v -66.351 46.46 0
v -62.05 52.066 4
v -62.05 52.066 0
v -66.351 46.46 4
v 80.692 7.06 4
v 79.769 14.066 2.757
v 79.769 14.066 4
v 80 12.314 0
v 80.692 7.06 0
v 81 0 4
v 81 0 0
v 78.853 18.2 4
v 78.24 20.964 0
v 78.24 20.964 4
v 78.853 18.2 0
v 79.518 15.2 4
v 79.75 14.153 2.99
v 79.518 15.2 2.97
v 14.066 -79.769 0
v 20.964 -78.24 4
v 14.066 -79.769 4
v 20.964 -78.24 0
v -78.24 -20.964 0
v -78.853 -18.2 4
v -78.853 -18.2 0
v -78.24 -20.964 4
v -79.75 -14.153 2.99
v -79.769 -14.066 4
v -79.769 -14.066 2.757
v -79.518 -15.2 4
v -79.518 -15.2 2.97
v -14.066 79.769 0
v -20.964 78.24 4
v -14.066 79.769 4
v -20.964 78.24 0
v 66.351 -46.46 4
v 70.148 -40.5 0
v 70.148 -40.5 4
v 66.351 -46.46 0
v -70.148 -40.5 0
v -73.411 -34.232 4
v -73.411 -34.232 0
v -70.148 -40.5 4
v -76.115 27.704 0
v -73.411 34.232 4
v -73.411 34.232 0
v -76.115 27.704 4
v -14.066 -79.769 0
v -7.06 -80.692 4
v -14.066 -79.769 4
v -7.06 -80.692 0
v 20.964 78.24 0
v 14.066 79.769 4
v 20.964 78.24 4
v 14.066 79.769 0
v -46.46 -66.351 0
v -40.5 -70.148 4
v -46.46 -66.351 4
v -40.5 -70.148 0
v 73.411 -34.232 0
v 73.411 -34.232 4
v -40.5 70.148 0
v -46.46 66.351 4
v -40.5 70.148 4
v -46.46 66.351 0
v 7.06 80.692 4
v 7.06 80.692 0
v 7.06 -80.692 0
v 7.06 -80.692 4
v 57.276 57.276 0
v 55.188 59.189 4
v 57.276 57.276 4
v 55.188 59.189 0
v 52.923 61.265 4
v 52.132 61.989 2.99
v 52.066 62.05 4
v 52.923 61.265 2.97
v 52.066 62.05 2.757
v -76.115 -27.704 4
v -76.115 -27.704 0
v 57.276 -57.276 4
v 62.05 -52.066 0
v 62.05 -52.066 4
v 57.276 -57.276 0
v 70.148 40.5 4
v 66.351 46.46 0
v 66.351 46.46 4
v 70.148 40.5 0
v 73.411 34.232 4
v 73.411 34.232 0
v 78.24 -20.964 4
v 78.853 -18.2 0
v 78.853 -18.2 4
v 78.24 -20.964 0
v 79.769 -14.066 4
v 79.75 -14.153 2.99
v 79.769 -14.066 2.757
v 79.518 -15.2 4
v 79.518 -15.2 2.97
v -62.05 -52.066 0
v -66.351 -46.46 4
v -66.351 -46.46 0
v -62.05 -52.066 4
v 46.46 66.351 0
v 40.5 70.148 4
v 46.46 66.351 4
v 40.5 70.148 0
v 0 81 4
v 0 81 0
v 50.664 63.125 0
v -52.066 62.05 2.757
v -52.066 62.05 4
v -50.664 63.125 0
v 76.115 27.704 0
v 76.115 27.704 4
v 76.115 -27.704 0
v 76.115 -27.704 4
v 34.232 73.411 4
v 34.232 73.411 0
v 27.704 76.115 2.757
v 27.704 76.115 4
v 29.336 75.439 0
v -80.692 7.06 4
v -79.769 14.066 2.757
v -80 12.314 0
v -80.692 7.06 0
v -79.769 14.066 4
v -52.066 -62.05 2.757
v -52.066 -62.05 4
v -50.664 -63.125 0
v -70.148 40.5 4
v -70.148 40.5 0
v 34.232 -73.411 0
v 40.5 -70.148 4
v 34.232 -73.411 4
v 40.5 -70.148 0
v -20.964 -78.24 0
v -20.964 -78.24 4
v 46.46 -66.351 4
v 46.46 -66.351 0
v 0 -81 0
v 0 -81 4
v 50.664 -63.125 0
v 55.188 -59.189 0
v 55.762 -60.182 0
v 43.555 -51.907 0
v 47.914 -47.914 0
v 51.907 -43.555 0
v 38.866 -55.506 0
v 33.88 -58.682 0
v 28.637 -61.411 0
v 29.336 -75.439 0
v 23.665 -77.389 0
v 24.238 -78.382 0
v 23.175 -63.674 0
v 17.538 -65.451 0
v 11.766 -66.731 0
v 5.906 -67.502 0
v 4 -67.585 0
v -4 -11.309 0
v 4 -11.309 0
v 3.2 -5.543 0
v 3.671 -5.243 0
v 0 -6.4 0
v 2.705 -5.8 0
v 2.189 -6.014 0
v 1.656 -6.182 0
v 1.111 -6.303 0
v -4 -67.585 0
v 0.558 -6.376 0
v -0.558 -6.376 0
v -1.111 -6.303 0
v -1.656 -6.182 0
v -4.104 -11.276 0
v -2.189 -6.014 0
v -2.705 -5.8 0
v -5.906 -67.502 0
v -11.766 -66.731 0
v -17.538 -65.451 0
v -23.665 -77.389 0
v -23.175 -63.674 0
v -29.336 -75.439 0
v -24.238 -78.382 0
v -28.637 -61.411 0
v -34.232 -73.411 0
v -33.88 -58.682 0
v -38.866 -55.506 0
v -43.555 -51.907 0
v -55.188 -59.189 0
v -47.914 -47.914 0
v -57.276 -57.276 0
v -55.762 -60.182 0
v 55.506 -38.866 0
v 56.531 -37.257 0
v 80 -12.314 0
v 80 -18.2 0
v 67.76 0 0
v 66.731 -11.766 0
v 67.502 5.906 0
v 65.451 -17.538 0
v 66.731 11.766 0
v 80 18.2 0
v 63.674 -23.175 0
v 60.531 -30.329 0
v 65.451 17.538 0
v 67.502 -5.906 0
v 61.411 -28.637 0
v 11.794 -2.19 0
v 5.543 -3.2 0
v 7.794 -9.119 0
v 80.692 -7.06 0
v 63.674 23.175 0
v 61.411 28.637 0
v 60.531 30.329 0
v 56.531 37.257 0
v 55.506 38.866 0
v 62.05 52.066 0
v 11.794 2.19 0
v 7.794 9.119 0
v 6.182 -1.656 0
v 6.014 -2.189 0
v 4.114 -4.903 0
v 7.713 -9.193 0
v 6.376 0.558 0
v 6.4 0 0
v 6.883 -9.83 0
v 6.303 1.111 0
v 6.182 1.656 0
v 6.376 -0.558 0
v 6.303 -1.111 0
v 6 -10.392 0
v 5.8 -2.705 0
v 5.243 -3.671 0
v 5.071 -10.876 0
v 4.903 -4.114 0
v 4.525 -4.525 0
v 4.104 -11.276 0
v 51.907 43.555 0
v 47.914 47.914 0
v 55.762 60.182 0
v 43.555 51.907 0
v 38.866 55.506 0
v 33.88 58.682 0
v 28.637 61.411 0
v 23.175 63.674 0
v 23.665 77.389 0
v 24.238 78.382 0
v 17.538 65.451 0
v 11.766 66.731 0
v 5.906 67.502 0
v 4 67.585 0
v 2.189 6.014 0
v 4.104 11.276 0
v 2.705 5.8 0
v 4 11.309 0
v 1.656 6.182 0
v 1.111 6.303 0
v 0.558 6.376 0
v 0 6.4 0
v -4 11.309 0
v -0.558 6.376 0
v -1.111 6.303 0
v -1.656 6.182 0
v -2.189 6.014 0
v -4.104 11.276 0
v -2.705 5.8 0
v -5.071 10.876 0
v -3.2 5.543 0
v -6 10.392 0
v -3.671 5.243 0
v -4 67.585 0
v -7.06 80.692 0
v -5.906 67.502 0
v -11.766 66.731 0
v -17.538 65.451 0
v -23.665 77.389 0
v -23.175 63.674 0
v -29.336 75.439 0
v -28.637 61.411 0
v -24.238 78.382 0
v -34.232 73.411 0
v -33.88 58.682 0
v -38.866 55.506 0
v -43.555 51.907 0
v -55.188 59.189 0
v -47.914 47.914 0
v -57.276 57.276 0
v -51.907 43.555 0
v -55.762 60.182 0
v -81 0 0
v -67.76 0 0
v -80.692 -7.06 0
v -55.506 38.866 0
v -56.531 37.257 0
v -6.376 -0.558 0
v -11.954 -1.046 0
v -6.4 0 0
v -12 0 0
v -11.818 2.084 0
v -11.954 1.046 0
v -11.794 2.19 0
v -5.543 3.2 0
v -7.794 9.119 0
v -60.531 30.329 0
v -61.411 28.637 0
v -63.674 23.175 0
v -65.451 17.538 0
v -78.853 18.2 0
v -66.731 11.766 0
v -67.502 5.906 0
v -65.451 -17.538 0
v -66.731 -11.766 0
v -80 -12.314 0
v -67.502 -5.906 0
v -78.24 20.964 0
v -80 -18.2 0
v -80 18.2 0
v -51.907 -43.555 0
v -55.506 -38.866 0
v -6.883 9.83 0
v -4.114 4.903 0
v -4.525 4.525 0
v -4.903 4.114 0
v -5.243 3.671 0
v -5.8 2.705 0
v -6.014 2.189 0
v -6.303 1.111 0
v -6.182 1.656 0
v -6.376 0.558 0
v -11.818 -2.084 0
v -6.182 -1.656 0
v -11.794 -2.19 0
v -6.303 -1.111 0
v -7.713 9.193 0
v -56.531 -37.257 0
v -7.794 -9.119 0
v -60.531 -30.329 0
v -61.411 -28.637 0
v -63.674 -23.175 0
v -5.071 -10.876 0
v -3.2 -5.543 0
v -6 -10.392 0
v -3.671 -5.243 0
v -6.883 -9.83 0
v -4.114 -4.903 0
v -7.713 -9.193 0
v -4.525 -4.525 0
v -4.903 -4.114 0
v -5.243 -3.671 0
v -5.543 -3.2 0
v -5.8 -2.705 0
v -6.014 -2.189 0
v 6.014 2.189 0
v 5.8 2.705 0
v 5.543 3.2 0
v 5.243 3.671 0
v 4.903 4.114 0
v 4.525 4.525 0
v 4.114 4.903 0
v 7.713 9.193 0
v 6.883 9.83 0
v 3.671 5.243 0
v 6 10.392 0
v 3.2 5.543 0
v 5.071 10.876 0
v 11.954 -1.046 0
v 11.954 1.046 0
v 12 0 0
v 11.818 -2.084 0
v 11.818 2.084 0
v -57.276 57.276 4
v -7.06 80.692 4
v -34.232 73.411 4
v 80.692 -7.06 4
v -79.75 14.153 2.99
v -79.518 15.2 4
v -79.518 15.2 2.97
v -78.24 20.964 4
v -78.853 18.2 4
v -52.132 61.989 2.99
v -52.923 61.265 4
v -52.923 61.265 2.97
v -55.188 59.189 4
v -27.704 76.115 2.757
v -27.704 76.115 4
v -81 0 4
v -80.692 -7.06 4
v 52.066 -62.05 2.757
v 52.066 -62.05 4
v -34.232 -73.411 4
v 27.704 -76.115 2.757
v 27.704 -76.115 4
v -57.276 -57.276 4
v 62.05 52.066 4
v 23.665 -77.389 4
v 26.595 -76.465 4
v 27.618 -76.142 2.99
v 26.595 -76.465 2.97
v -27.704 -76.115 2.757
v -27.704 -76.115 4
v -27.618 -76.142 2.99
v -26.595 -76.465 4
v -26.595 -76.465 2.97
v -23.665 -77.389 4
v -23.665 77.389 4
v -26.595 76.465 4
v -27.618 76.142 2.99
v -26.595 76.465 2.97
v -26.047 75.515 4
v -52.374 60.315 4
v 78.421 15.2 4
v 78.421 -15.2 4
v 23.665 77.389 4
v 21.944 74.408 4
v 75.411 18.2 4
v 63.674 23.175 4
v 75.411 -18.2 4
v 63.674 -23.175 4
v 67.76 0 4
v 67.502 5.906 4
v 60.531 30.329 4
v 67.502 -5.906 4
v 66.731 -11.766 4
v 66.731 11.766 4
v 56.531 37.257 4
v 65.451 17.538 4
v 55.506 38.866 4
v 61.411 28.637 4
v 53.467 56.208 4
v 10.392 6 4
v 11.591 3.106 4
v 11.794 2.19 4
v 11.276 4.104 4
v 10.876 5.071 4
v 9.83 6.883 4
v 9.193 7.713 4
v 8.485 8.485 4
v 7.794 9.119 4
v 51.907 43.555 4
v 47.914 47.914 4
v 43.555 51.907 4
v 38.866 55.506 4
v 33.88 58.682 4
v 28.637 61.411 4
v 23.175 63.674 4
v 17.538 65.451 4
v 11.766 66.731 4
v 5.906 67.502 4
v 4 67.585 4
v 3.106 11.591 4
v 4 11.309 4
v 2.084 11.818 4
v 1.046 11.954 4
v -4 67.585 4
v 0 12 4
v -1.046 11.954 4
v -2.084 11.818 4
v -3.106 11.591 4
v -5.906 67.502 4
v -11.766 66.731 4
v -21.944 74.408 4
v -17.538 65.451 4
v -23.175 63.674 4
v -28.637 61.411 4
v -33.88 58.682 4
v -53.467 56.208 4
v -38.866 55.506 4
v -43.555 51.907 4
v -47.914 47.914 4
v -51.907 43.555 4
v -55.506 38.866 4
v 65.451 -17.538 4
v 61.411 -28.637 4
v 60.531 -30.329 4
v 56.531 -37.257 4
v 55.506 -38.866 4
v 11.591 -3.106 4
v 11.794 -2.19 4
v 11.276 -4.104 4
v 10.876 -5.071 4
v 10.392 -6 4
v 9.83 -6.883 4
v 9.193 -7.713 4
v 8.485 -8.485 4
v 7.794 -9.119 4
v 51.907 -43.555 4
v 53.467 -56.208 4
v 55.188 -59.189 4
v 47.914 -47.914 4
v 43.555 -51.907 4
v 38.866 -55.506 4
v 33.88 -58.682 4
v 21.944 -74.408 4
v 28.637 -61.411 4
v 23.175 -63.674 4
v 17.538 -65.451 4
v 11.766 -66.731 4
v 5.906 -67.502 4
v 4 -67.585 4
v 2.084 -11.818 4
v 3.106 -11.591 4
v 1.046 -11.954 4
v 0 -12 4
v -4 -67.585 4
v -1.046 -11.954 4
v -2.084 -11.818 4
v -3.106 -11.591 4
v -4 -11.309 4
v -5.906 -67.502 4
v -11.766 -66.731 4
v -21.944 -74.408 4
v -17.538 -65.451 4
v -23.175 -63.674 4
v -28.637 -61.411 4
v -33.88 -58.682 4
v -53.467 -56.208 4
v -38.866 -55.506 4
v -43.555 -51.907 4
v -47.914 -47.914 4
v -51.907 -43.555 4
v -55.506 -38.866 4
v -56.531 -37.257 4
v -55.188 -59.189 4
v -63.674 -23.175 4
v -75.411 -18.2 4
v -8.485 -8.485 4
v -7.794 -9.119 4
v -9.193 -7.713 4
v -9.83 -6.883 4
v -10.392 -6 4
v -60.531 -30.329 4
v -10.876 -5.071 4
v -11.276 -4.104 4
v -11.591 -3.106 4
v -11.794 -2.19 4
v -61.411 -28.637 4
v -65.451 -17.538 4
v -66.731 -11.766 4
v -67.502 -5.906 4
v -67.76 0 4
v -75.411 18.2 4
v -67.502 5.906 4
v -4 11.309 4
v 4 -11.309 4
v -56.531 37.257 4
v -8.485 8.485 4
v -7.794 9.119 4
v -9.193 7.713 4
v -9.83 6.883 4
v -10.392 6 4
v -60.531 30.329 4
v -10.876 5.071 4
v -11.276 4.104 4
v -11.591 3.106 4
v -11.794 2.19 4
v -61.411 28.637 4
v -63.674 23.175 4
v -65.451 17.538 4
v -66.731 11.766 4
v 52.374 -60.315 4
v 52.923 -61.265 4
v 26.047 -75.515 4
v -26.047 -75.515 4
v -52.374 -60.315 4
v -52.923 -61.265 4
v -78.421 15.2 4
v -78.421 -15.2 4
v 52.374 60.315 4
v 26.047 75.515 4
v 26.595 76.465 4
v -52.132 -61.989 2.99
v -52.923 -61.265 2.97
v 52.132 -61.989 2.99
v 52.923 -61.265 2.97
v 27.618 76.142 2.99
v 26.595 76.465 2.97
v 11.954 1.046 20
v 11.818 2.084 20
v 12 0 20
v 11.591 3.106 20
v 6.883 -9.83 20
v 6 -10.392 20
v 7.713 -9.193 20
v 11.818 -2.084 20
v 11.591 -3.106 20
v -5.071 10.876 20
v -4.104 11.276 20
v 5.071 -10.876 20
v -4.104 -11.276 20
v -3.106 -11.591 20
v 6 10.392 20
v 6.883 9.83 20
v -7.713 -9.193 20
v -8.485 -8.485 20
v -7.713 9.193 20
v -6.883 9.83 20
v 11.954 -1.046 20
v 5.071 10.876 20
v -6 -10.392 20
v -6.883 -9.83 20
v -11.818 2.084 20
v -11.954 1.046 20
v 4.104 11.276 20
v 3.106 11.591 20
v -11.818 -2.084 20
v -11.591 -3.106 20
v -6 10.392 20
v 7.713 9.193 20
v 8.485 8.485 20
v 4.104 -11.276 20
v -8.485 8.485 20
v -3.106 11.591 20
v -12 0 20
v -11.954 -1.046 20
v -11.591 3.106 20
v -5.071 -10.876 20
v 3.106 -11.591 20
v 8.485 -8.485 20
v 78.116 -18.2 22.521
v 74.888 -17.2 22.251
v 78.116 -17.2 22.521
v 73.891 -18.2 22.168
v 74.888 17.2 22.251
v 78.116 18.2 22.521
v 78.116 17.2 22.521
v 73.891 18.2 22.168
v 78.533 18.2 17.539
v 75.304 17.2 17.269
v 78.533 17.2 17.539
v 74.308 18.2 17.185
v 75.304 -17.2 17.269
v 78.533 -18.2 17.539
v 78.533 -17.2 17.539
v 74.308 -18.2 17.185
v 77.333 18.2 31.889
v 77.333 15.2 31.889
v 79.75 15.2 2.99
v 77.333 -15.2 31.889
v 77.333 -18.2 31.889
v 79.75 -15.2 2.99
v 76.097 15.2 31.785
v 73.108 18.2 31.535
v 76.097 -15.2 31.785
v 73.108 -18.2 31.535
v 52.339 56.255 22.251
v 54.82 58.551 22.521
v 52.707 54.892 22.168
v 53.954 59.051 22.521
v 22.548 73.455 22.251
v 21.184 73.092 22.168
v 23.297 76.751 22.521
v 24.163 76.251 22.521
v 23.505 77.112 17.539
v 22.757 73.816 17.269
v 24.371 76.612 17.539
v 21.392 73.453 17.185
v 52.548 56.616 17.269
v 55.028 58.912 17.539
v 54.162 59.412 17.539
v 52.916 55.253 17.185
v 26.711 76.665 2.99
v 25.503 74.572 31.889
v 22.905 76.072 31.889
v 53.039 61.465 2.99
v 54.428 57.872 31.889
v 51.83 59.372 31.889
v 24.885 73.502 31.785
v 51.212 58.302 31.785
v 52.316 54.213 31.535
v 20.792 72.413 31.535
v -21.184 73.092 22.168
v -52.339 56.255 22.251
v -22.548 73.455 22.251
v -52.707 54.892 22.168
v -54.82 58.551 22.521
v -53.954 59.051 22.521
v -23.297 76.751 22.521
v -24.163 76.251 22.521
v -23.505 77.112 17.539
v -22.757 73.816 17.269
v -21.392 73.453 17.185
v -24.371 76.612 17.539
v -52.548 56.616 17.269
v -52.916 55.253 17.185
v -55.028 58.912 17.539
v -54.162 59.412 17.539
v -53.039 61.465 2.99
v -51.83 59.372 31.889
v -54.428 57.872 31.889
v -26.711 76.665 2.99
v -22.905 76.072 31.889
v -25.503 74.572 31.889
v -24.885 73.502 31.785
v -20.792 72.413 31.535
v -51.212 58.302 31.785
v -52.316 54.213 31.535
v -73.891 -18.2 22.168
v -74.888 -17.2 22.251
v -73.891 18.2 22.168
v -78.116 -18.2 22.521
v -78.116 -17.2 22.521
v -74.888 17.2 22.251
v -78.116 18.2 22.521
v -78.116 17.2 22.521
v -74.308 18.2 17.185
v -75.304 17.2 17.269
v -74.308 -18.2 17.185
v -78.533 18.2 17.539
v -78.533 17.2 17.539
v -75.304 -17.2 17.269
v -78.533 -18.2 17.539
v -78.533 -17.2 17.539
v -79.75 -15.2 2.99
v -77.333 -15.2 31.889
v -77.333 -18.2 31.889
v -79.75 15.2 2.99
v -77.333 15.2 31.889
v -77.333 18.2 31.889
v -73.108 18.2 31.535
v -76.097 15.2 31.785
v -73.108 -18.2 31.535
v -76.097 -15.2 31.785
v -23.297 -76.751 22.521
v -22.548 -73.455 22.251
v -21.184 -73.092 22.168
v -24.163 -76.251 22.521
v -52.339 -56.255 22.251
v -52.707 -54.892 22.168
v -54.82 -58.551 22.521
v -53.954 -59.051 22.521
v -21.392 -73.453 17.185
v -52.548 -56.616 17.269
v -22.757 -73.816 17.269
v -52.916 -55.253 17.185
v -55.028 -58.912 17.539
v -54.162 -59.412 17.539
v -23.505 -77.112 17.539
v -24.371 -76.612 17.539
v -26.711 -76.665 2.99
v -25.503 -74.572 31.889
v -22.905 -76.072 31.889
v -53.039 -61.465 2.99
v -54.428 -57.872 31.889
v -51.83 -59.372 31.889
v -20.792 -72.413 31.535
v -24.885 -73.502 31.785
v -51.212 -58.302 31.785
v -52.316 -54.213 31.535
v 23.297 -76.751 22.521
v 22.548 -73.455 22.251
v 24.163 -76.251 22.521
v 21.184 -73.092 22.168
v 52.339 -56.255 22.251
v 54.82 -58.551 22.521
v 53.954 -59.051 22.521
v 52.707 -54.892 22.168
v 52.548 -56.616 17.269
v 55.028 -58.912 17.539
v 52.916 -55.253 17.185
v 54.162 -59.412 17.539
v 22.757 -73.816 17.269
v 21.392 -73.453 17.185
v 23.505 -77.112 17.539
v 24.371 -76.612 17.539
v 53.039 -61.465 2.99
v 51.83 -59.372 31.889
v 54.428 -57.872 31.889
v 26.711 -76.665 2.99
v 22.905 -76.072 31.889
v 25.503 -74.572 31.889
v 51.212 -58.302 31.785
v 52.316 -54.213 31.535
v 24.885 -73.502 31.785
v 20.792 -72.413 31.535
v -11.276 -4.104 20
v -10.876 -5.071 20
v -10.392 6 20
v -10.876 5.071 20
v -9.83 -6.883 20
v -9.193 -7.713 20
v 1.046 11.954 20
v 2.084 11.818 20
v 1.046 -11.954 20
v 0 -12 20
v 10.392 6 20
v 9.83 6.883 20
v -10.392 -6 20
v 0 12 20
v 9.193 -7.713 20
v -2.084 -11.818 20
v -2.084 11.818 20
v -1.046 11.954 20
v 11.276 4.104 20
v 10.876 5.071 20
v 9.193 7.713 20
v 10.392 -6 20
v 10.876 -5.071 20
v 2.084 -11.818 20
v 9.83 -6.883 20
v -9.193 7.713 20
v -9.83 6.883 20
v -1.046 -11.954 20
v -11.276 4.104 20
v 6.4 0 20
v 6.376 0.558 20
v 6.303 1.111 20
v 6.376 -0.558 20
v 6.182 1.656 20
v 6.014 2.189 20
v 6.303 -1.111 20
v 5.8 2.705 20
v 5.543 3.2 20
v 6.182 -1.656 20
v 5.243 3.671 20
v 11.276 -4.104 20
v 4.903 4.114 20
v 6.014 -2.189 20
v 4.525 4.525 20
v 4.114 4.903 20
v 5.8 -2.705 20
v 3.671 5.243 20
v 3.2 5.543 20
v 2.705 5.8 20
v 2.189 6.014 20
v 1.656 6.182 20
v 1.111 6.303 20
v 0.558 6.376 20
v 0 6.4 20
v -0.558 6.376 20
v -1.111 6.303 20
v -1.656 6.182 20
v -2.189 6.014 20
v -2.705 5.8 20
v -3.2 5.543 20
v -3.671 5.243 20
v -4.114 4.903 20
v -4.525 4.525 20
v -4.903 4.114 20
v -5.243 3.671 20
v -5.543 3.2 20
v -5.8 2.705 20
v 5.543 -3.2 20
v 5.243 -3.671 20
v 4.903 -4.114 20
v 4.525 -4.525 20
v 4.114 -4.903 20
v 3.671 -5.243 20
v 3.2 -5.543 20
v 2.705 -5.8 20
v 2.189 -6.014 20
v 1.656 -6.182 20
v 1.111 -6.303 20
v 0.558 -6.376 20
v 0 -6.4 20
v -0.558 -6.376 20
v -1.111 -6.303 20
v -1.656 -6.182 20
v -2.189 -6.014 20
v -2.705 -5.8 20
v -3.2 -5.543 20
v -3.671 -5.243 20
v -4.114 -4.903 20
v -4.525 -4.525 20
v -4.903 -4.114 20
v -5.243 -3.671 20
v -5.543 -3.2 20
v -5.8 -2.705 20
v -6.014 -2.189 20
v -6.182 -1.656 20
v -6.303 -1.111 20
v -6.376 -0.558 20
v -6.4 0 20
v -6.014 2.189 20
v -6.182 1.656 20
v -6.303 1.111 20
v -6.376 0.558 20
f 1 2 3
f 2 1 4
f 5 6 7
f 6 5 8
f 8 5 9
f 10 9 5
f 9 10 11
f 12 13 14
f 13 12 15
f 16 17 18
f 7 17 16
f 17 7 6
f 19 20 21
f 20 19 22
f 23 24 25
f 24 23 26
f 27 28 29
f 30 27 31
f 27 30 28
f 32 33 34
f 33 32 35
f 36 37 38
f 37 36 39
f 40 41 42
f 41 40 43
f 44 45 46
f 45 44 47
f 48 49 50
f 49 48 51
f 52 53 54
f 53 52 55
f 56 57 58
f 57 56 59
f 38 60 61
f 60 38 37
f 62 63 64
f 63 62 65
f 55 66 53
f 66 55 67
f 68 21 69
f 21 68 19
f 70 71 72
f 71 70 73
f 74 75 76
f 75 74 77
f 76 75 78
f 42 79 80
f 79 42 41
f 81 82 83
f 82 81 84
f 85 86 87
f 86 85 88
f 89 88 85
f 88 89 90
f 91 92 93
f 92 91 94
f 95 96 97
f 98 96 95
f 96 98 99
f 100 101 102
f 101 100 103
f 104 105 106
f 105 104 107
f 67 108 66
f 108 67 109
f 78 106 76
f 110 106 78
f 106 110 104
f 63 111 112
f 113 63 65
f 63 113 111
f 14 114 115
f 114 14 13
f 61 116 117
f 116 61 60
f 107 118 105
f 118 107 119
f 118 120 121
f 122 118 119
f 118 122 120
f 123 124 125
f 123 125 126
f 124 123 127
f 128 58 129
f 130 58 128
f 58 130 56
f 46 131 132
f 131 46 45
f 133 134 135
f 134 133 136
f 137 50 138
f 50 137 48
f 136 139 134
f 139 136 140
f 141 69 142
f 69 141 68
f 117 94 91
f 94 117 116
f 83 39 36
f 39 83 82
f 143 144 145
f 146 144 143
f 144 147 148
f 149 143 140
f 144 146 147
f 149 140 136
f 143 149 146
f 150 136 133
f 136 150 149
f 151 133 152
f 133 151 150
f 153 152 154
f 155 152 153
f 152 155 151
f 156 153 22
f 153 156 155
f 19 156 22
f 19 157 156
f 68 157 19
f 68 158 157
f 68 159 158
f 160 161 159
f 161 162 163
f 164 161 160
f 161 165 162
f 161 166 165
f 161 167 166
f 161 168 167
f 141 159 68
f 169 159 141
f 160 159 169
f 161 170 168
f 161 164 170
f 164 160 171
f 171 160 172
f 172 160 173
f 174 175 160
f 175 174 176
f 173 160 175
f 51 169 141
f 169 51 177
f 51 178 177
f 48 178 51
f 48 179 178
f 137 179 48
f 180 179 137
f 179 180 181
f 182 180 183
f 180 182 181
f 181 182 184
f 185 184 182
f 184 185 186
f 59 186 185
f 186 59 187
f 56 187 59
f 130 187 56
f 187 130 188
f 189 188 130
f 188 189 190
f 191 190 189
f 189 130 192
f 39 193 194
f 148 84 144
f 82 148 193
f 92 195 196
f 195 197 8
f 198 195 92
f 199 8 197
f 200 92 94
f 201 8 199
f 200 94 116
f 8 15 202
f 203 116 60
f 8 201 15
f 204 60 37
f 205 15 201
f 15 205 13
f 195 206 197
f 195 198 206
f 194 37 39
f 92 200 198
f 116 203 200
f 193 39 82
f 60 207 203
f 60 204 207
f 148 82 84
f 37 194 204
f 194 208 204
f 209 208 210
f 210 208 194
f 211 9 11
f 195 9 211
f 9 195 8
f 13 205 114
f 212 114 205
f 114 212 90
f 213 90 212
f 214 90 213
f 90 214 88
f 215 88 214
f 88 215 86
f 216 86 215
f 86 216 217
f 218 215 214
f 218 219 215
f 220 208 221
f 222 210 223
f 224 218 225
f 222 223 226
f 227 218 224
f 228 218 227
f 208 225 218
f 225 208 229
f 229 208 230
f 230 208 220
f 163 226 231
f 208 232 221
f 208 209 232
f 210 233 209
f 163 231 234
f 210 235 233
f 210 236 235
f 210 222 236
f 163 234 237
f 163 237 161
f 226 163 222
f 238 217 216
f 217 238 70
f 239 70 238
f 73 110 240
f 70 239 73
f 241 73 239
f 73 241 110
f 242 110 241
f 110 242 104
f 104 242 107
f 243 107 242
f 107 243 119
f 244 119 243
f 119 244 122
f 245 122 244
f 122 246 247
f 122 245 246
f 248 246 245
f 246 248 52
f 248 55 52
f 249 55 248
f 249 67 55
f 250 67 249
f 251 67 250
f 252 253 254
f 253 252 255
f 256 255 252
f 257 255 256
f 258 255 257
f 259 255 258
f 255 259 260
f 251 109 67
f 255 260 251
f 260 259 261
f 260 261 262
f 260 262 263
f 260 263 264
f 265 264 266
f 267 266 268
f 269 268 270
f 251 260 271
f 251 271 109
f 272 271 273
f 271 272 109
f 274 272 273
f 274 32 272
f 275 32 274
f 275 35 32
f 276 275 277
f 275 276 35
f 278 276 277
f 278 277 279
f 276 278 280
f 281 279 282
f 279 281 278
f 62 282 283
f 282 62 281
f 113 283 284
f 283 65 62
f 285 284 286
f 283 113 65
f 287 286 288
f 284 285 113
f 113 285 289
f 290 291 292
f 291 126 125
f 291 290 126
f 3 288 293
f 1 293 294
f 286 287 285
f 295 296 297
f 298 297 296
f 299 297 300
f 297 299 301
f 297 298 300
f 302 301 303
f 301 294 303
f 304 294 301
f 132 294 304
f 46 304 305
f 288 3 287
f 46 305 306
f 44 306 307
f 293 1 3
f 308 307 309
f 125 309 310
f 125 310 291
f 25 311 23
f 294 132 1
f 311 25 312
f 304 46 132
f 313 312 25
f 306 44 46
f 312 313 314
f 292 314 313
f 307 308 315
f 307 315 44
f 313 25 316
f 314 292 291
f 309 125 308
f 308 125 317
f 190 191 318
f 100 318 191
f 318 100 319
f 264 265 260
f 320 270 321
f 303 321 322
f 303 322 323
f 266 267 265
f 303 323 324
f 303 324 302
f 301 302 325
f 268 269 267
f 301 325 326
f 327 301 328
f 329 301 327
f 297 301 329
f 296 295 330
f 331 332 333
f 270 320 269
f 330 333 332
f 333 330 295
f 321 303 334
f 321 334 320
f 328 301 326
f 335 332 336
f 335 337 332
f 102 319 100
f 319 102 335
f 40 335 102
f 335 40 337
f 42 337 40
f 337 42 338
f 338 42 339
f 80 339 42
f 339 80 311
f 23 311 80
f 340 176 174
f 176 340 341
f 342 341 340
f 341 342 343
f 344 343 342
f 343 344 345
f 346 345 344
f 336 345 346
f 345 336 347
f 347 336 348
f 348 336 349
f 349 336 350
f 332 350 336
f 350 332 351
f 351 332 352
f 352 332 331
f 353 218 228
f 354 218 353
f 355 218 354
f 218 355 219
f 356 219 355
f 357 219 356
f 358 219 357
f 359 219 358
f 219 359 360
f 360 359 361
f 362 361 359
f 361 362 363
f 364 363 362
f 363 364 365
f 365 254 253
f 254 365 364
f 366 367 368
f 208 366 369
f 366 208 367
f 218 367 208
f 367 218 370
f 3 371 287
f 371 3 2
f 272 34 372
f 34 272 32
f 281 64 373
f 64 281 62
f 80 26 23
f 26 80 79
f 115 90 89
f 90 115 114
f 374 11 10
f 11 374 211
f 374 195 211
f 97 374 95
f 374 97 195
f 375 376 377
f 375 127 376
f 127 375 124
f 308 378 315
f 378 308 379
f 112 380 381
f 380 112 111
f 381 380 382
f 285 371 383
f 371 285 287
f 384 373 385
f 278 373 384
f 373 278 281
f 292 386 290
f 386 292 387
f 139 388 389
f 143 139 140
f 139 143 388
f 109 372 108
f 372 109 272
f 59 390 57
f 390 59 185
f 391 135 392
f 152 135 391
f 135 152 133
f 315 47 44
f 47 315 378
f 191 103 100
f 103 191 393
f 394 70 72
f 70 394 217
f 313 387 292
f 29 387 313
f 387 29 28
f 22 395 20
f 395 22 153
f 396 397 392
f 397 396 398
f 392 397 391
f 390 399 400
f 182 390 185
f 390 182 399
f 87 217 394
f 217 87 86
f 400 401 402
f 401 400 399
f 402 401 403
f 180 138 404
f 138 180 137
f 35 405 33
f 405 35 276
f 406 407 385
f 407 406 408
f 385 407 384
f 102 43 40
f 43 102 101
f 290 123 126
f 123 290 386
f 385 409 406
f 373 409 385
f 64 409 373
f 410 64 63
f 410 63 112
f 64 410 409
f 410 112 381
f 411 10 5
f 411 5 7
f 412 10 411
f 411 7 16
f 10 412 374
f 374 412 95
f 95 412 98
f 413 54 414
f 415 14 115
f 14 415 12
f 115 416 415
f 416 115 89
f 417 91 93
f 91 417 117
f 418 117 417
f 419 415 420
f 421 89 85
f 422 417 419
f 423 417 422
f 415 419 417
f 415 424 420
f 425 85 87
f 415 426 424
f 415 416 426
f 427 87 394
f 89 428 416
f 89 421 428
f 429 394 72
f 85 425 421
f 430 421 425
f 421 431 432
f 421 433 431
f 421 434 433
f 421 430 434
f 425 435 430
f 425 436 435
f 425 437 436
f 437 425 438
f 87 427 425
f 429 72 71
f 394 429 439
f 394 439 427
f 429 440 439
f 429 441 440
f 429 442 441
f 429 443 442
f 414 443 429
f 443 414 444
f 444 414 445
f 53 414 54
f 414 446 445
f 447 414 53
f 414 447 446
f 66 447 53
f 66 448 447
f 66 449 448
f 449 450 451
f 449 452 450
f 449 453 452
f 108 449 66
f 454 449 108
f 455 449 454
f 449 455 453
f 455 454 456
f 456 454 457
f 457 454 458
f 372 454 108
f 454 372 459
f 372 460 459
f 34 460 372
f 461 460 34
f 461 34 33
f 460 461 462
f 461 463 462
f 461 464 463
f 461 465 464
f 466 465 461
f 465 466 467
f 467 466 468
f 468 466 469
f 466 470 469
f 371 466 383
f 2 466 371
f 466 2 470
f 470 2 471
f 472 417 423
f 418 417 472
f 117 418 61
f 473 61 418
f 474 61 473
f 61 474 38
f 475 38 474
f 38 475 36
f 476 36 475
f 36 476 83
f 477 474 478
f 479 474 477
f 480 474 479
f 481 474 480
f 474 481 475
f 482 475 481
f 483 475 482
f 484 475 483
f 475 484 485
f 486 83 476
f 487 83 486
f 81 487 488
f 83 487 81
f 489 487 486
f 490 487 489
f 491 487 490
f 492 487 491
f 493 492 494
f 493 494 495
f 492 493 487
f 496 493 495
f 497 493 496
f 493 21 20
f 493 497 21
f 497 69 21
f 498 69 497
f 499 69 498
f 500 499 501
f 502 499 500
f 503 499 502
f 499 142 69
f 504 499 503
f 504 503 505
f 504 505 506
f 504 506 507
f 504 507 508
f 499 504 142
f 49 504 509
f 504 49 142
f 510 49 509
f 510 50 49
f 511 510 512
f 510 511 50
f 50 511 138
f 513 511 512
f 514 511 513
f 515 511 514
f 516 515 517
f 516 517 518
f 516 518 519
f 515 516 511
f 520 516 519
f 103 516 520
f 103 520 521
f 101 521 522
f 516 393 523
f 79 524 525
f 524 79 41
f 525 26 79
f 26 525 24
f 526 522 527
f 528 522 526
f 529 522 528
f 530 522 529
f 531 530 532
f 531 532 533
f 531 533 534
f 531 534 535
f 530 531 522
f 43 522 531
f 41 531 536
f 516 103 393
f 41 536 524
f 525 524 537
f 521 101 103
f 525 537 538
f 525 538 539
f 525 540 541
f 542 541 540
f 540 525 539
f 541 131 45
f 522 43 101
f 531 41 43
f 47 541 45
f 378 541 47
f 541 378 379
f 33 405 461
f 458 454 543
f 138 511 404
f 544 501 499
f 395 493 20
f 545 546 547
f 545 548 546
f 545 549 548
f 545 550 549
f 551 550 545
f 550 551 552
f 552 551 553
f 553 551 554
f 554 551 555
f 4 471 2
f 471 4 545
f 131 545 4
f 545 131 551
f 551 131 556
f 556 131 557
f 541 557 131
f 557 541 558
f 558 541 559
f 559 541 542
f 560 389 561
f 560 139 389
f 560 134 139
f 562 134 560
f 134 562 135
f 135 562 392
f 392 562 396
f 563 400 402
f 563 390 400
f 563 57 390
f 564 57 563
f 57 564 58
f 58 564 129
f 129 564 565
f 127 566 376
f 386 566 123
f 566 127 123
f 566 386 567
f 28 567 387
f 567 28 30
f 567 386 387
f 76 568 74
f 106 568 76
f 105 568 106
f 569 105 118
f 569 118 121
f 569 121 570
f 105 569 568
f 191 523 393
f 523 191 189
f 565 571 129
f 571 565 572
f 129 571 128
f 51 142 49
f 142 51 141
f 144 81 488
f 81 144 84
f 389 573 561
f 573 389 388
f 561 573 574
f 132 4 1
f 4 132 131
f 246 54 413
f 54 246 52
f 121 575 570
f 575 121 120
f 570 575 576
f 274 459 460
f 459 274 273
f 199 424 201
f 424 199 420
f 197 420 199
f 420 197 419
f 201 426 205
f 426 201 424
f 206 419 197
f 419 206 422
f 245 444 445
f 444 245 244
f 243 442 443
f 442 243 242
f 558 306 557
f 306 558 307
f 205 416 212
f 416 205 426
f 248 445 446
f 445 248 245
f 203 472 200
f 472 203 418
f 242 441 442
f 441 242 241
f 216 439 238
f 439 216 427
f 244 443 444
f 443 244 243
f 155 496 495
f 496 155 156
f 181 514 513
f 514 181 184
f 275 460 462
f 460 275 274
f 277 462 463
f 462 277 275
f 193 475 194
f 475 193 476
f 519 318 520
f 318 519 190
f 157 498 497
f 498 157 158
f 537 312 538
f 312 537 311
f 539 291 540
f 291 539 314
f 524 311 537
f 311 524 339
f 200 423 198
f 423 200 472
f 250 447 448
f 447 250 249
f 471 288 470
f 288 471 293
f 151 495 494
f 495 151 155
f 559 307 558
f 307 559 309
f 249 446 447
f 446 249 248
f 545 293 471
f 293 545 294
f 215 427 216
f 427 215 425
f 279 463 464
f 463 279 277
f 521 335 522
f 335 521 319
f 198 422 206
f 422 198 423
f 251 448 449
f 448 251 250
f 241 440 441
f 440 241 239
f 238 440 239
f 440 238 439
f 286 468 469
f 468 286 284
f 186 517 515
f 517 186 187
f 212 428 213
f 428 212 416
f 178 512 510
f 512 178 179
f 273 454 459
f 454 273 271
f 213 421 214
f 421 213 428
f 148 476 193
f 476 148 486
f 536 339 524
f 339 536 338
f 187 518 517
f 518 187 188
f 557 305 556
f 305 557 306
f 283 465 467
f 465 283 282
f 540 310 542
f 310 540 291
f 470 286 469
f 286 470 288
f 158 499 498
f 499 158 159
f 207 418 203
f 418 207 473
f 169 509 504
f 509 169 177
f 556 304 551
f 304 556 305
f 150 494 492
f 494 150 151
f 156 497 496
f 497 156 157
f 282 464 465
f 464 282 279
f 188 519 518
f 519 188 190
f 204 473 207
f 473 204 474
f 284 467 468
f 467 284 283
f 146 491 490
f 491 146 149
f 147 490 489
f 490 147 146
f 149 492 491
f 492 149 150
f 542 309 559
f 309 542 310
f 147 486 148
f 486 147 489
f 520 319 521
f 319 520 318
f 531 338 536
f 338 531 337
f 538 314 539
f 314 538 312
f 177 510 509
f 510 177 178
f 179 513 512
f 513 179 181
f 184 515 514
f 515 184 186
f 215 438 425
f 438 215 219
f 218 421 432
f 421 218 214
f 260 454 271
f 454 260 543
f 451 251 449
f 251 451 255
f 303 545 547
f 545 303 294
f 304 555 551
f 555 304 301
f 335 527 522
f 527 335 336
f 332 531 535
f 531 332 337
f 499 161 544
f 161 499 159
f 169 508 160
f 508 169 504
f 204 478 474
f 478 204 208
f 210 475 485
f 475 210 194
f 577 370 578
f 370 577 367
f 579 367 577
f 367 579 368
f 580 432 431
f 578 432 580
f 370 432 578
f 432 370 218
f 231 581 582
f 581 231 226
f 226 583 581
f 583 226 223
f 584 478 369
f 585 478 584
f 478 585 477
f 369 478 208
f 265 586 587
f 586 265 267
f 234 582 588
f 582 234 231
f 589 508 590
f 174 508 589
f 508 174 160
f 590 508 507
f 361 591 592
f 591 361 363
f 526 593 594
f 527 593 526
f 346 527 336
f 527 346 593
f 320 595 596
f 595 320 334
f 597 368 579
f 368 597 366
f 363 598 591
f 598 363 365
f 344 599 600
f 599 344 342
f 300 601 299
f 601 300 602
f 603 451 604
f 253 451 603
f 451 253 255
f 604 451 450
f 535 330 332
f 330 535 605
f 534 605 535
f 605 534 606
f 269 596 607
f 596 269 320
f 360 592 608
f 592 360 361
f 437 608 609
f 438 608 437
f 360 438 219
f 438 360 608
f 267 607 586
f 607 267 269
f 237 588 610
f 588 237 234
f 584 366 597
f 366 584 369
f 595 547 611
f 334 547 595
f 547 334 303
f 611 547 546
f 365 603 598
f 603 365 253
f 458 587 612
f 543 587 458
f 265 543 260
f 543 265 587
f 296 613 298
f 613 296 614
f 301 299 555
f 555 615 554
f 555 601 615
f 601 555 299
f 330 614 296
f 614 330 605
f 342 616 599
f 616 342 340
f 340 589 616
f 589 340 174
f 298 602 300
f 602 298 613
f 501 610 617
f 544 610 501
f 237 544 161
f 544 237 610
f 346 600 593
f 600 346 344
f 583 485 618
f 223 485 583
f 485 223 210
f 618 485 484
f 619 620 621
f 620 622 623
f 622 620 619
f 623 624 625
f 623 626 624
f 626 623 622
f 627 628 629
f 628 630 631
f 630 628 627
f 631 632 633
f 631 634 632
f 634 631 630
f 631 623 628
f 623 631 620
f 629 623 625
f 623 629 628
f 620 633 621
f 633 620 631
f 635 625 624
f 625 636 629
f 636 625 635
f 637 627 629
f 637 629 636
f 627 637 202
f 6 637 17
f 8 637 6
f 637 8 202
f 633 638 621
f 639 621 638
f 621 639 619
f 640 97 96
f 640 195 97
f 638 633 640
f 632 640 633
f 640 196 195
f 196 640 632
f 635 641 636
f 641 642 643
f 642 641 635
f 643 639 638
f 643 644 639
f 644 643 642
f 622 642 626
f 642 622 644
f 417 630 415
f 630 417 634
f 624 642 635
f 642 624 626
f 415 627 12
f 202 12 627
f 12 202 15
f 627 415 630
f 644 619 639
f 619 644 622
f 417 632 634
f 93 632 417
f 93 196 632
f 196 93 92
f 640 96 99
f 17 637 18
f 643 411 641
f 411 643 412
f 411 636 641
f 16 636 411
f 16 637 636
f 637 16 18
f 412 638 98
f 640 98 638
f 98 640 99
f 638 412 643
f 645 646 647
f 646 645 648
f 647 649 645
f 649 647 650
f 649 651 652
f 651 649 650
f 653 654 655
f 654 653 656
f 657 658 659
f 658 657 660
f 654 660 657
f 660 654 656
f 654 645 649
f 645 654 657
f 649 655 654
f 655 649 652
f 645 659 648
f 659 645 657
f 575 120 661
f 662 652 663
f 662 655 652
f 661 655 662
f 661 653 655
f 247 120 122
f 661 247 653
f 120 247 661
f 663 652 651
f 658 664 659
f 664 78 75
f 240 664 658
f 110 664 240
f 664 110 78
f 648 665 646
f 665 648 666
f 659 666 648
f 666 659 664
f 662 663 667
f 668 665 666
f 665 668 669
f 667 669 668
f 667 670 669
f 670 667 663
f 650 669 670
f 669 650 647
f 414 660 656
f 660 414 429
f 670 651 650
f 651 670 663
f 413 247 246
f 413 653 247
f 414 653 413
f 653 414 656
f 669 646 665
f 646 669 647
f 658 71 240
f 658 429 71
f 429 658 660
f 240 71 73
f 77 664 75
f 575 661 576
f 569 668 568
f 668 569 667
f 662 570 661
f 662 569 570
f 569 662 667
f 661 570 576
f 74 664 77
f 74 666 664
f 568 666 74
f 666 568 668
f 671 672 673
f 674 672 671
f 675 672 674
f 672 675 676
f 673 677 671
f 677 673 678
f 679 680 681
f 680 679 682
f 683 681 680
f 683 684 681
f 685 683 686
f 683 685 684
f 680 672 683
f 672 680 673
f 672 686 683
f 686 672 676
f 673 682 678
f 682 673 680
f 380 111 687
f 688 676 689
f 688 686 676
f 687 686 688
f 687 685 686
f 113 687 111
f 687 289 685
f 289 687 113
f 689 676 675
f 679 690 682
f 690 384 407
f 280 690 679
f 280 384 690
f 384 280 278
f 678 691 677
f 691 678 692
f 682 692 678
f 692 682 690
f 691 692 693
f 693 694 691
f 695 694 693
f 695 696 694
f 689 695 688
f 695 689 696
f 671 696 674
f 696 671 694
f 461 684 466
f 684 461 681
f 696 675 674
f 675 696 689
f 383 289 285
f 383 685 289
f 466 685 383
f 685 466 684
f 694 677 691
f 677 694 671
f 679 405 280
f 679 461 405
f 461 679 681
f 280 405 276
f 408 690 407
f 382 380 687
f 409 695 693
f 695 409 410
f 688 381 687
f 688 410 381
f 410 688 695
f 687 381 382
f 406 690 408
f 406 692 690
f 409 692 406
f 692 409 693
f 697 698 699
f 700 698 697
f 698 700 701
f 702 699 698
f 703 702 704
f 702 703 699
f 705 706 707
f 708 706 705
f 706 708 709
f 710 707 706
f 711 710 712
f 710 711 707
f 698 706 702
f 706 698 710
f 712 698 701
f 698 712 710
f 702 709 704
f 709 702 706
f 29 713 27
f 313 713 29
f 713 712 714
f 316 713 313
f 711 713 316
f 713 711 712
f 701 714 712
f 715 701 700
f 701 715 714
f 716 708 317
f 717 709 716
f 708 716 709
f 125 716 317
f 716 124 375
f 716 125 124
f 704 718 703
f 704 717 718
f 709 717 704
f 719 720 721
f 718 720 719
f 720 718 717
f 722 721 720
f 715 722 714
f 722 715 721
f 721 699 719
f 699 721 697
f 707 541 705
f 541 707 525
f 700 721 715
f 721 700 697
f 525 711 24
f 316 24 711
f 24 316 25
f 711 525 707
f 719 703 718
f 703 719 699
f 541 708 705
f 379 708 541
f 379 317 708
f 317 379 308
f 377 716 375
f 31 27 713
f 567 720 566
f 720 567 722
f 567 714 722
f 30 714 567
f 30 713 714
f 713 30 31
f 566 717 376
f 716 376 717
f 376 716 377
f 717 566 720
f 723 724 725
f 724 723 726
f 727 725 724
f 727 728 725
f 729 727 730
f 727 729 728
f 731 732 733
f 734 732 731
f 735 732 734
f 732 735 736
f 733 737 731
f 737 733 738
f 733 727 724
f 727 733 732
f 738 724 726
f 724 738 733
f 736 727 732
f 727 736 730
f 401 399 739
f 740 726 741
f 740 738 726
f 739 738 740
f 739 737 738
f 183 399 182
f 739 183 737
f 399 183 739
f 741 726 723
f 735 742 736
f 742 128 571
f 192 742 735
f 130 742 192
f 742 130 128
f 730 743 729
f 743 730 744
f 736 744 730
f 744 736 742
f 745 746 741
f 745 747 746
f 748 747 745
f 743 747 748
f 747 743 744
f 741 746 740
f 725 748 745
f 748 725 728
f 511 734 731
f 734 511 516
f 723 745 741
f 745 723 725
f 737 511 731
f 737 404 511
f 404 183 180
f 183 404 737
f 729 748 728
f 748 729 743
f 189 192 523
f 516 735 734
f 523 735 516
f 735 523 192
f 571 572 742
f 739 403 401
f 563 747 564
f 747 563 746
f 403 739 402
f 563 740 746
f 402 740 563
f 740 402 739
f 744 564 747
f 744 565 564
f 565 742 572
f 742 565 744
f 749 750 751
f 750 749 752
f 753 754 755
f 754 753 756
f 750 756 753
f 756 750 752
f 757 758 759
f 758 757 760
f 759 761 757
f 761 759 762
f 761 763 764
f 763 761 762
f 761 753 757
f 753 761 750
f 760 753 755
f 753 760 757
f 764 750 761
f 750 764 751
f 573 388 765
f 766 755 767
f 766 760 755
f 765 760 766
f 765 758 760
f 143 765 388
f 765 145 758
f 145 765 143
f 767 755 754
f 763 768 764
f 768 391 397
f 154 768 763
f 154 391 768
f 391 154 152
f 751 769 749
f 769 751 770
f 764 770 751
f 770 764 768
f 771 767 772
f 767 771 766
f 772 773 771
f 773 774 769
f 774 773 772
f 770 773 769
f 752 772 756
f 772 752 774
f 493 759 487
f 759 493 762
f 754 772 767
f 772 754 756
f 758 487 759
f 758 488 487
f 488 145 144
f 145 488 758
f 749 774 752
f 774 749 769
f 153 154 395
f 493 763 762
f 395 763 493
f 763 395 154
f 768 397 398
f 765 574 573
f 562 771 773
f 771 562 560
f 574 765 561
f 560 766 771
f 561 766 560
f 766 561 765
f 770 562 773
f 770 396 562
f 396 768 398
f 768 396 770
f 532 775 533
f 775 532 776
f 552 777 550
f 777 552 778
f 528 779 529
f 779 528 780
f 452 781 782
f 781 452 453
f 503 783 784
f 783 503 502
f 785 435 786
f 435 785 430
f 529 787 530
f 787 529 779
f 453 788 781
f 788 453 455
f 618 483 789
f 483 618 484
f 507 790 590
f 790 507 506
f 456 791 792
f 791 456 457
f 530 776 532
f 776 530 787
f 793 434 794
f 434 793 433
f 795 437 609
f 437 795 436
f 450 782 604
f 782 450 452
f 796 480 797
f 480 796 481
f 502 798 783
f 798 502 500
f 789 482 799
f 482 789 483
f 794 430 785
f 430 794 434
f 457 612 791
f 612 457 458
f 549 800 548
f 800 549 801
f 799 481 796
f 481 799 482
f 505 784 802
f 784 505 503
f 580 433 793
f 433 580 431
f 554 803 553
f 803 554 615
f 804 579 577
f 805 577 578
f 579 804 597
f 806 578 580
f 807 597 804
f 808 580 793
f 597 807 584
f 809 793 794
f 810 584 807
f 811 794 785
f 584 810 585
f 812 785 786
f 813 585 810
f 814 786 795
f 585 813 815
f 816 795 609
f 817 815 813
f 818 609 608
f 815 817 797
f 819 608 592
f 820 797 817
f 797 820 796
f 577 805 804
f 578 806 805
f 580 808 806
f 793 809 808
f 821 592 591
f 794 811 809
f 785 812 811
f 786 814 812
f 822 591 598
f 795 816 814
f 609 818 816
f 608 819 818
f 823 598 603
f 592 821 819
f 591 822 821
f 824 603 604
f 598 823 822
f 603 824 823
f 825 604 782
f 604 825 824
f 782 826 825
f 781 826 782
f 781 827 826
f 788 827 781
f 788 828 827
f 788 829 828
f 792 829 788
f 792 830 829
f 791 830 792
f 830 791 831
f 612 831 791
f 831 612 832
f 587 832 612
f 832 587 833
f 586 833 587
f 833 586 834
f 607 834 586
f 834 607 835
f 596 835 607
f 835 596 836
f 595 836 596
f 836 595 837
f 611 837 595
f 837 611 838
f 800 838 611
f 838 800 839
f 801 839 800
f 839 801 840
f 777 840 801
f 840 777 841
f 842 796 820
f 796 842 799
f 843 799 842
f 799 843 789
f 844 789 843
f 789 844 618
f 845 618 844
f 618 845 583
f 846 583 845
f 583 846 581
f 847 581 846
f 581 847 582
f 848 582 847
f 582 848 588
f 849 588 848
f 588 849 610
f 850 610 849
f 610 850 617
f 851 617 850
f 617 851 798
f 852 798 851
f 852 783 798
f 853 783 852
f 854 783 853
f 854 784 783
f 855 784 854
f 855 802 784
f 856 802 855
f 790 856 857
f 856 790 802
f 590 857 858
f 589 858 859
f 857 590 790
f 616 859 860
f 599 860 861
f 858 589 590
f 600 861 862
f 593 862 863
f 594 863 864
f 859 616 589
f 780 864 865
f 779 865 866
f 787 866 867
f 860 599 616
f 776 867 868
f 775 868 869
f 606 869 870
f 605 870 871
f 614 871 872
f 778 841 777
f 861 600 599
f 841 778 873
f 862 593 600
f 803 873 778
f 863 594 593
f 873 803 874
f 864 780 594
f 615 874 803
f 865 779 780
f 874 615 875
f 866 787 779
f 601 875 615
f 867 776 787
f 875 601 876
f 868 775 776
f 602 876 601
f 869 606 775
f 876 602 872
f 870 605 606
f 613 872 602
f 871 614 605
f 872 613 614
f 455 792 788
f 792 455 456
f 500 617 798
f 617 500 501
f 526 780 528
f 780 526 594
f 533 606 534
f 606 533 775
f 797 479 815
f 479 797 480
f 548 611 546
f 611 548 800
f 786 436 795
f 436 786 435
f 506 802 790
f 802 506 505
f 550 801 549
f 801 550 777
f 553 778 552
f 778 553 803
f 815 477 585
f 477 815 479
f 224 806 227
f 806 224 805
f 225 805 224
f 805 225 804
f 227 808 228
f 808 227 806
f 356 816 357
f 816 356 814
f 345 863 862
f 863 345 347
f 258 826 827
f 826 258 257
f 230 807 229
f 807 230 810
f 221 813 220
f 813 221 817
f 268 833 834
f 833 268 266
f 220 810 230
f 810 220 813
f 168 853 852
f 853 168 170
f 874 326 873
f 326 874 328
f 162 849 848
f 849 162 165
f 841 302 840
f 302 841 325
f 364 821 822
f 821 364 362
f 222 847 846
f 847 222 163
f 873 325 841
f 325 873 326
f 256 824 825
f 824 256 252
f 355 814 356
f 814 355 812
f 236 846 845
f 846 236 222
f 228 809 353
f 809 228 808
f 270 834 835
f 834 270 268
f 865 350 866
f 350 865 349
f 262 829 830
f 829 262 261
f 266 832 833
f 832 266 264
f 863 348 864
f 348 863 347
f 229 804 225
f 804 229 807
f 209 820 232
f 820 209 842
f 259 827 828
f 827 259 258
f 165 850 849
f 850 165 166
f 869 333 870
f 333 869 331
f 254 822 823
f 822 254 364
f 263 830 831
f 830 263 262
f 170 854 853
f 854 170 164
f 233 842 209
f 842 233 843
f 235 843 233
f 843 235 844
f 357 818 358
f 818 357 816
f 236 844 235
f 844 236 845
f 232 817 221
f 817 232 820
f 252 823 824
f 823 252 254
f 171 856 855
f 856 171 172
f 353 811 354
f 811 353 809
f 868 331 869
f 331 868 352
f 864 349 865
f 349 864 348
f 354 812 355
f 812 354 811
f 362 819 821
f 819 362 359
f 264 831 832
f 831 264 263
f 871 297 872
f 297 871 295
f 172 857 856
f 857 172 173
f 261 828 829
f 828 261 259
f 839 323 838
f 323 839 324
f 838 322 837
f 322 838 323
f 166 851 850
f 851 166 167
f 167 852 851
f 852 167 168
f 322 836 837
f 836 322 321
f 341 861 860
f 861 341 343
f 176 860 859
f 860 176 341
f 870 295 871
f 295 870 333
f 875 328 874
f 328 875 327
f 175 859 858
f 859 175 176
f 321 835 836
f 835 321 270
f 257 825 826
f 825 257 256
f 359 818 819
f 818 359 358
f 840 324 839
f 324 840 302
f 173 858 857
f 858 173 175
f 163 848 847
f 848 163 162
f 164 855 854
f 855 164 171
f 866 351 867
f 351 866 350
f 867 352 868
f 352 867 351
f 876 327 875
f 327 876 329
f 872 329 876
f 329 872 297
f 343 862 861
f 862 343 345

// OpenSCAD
// file: lib.scad
// Shared pieces for the Winterlight PETG parts (Bambu Lab A1, 256 × 256 × 256 mm).
// Millimetres. Measure your own mounting strip and set strip_w / strip_t on the
// command line (-D strip_w=20) or in OpenSCAD's Customizer before printing.
$fn = 72;
strip_w = 30;   // pixel mounting strip width
strip_t = 1.54; // pixel mounting strip thickness (measured)
clr = 0.4;      // clearance per side, a snug slide fit in PETG
wall = 3;       // channel walls
tie_d = 4.5;    // holes for the 2.5 mm cable ties or an M4 bolt

// Closed slots the strip slides through (the ground strip's posts).
slot_t = strip_t + 2*clr;
slot_w = strip_w + 2*clr;
// Open pockets the strip ends sit in (mini trees, tree hub and ring): a close
// fit across, and a little shallower than the strip, so the strip stands
// proud of the face and the cable tie clamps it down.
proud = 0.3;
pocket_t = strip_t - proud;
pocket_w = strip_w + 2*0.2;
// Outside size of a strip channel: radial depth and tangential width.
ch_depth = pocket_t + wall;
ch_width = pocket_w + 2*wall;

// A channel that holds a strip's end: the strip runs up +Z with its face
// (and its pixels) towards +X. Open on the +X side so the strip drops in,
// with a groove round the outside where a cable tie pulls it home.
module channel(h, floor = 3) {
  z0 = h*0.55;
  difference() {
    translate([-ch_depth, -ch_width/2, 0]) cube([ch_depth, ch_width, h]);
    translate([-pocket_t, -pocket_w/2, floor]) cube([pocket_t + 1, pocket_w, h]);
    // Tie groove, 1 mm deep, round the back and both sides.
    difference() {
      translate([-ch_depth - 1, -ch_width/2 - 1, z0]) cube([ch_depth + 2, ch_width + 2, 5]);
      translate([-ch_depth + 1, -ch_width/2 + 1, z0 - 1]) cube([ch_depth + 2, ch_width - 2, 7]);
    }
  }
}

// n channels on a circle of radius r (the strip's face), leaning by tilt
// degrees: positive leans the top inwards, negative outwards.
module channel_ring(n, r, tilt, h, start = 0) {
  intersection() {
    for (i = [0 : n - 1]) rotate([0, 0, start + 360*i/n])
      translate([r, 0, 0]) rotate([0, -tilt, 0]) channel(h);
    translate([-1000, -1000, 0]) cube([2000, 2000, 1000]);
  }
}

// A flat ring with spokes to a centre boss: the plate that ties the channels together.
module spoked_ring(r_out, r_in, t, n, boss_d, arm_w = 8) {
  difference() { cylinder(r = r_out, h = t); translate([0, 0, -1]) cylinder(r = r_in, h = t + 2); }
  for (i = [0 : n - 1]) rotate([0, 0, 360*i/n + 180/n]) translate([0, -arm_w/2, 0]) cube([r_in + 1, arm_w, t]);
  cylinder(d = boss_d, h = t);
}

// Bricks for ballast: the paving in front of the house is stone, so nothing
// can be staked into it. The feet are trays that hold standard concrete paving
// bricks (betonklinkers, 22 × 11 × 8 cm, about 4 kg each). Set your own size.
brick_l = 220;
brick_w = 110;
brick_h = 80;
brick_clr = 3;      // bricks vary a few millimetres
tray_wall = 1.6;
tray_h = 20;
tray_lip = 10;      // the floor is only a ledge round the edge, to save PETG
tray_floor = 1.6;

// A tray for n bricks side by side along Y, its corner at the origin.
// gap: extra room between the bricks (for a rib); returns nothing, see tray_size.
function tray_inner(n = 1, gap = 0) = [brick_l + 2*brick_clr, n*(brick_w + 2*brick_clr) + gap];
module tray(n = 1, gap = 0) {
  in = tray_inner(n, gap);
  out = [in[0] + 2*tray_wall, in[1] + 2*tray_wall];
  difference() {
    cube([out[0], out[1], tray_h]);
    translate([tray_wall, tray_wall, tray_floor]) cube([in[0], in[1], tray_h]);
    translate([tray_wall + tray_lip, tray_wall + tray_lip, -1]) cube([in[0] - 2*tray_lip, in[1] - 2*tray_lip, tray_floor + 2]);
  }
}
// main file
// Mini tree, base ring. Six strip spokes stand in its channels and lean in to
// the top cap; an 8 mm rod through the centre stiffens the tree and pushes
// into the clipped bush it stands on. Print as is, flat side down, no supports.
include <lib.scad>
spokes = 6;
r_base = 80;     // spoke radius at the base (the model's 8 cm)
r_top = 34;      // spoke radius at the top cap (they can't meet at a point)
height = 550;    // base to tip, as in the model
rod_d = 12;      // centre rod: 10–12 mm bamboo cane
ch_h = 32;
tilt = atan((r_base - r_top)/height);
plate = 4;

difference() {
  union() {
    spoked_ring(r_base + 1, r_base - ch_depth - 8, plate, spokes, rod_d + 12);
    cylinder(d = rod_d + 12, h = 20);
    channel_ring(spokes, r_base, tilt, ch_h);
  }
  translate([0, 0, -1]) cylinder(d = rod_d + 2*clr, h = 30);
}
